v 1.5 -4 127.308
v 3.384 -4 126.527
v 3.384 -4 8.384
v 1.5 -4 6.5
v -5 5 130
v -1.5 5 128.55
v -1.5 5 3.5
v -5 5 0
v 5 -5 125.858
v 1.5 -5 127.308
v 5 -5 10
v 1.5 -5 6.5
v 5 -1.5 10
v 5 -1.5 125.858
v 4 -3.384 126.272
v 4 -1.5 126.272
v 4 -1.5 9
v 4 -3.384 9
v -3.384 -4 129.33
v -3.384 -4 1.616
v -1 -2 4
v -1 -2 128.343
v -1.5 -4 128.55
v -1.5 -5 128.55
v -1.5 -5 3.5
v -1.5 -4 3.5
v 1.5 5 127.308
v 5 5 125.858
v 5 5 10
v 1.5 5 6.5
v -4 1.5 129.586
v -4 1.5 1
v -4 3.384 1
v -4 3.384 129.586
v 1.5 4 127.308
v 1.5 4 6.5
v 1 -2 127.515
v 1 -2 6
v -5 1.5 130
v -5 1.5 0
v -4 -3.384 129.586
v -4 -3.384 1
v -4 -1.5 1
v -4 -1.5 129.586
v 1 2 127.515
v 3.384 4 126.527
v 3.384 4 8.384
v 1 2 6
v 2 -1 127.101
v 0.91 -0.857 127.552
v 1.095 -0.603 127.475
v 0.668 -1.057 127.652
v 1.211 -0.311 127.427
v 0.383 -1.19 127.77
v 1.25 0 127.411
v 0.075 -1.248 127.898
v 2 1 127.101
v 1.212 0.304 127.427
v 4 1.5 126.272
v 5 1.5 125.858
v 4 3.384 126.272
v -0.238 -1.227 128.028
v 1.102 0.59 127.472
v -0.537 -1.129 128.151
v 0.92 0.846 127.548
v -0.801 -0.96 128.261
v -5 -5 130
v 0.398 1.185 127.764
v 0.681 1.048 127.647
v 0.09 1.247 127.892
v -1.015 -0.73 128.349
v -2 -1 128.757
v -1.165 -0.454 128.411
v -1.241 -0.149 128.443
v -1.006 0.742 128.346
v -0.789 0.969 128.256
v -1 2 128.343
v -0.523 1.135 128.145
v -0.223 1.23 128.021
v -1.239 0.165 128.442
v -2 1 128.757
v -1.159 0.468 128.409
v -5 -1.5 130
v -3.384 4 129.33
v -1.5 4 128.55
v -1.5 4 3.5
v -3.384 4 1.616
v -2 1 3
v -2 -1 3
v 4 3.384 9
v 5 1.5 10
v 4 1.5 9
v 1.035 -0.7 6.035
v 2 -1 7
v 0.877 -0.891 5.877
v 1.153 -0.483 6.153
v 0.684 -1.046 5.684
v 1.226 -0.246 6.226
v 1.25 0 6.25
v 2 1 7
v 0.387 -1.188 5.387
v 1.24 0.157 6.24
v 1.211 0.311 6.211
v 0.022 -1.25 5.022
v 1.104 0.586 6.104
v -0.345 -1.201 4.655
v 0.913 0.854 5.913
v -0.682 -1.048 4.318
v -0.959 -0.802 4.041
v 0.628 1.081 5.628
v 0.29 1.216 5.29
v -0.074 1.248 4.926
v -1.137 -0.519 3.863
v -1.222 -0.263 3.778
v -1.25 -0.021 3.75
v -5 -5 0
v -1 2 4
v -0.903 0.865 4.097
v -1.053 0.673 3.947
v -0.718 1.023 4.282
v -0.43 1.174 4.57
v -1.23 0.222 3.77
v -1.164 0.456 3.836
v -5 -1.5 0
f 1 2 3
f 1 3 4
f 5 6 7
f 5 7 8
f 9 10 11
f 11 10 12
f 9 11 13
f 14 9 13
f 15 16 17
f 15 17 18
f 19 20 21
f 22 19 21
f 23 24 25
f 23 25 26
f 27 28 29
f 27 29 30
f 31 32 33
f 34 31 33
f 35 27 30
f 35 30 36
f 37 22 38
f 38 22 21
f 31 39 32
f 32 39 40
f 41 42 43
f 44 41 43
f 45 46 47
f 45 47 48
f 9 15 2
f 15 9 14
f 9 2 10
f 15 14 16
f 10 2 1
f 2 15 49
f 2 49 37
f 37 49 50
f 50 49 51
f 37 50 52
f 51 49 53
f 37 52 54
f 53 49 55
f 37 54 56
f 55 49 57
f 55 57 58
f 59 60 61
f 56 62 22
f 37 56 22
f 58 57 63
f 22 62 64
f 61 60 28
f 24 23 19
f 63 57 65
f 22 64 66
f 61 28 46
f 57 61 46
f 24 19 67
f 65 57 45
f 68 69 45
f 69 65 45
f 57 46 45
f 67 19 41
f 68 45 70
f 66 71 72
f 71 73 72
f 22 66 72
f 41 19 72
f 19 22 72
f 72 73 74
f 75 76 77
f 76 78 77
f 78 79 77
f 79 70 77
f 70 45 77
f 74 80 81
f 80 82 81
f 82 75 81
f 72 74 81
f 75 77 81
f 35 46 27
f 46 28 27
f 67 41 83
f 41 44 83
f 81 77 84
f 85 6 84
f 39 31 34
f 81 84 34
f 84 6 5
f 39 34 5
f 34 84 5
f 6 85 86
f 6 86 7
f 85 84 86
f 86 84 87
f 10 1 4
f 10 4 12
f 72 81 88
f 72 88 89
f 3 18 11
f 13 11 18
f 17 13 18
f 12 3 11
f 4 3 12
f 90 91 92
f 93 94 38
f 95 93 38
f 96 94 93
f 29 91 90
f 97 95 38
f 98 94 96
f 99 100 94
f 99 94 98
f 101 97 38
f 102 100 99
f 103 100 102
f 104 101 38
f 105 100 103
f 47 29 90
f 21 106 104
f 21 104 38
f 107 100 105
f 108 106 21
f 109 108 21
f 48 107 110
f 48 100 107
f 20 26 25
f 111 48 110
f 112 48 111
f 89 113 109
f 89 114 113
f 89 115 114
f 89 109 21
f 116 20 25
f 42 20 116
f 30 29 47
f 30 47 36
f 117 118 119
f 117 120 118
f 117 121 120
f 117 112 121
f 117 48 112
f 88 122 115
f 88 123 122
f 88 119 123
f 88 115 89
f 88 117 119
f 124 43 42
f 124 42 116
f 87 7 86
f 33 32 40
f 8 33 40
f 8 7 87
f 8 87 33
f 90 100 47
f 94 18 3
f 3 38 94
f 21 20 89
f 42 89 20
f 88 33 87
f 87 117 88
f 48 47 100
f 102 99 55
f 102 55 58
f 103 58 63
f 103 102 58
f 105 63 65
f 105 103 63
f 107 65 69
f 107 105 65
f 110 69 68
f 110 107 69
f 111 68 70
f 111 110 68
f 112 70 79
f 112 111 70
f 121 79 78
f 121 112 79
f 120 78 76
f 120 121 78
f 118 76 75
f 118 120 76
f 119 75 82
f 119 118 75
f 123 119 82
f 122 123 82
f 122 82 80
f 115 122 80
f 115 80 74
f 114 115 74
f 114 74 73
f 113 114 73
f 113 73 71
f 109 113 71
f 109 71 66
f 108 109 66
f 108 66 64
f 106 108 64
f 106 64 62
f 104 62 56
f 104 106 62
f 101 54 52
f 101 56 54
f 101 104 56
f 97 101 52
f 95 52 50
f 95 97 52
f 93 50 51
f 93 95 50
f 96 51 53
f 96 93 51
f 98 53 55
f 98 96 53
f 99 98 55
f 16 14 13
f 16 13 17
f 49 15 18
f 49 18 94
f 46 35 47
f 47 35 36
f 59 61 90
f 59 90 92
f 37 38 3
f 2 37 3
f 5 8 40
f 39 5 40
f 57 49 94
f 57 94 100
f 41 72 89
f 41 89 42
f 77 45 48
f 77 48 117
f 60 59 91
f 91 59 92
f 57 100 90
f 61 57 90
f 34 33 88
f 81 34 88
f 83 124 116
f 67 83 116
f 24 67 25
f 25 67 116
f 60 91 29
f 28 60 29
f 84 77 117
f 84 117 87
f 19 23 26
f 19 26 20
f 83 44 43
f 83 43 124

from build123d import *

# Parameters (mm, degrees)
ESQUISSE2_R             = 1.25
BOSS_EXTRU_1_DEPTH      = 130
ENL_V_MAT_EXTRU_1_DEPTH = 11


with BuildPart() as part:
    # Esquisse2 → Boss.-Extru.1 (new body)
    with BuildSketch(Plane.XY):
        Polygon((-1, -2), (1, -2), (3.383507185, -4), (1.5, -4), (1.5, -5), (5, -5), (5, -1.5), (4, -1.5), (4, -3.383507185), (2, -1), (2, 1), (4, 3.383507185), (4, 1.5), (5, 1.5), (5, 5), (1.5, 5), (1.5, 4), (3.383507185, 4), (1, 2), (-1, 2), (-3.383507185, 4), (-1.5, 4), (-1.5, 5), (-5, 5), (-5, 1.5), (-4, 1.5), (-4, 3.383507185), (-2, 1), (-2, -1), (-4, -3.383507185), (-4, -1.5), (-5, -1.5), (-5, -5), (-1.5, -5), (-1.5, -4), (-3.383507185, -4), align=None)
        Circle(ESQUISSE2_R, mode=Mode.SUBTRACT)
    extrude(amount=BOSS_EXTRU_1_DEPTH)

    # Esquisse3 → Enlèv. mat.-Extru.1 (cut, through all)
    with BuildSketch(Plane(origin=(0, 5, 0), x_dir=(1, 0, 0), z_dir=(0, 1, 0))):
        Polygon((-5, 0), (5, 0), (5, -10), align=None)
        Polygon((5, -125.857864376), (-5, -130), (5, -130), align=None)
    extrude(amount=-ENL_V_MAT_EXTRU_1_DEPTH, mode=Mode.SUBTRACT)


solid = part.part
